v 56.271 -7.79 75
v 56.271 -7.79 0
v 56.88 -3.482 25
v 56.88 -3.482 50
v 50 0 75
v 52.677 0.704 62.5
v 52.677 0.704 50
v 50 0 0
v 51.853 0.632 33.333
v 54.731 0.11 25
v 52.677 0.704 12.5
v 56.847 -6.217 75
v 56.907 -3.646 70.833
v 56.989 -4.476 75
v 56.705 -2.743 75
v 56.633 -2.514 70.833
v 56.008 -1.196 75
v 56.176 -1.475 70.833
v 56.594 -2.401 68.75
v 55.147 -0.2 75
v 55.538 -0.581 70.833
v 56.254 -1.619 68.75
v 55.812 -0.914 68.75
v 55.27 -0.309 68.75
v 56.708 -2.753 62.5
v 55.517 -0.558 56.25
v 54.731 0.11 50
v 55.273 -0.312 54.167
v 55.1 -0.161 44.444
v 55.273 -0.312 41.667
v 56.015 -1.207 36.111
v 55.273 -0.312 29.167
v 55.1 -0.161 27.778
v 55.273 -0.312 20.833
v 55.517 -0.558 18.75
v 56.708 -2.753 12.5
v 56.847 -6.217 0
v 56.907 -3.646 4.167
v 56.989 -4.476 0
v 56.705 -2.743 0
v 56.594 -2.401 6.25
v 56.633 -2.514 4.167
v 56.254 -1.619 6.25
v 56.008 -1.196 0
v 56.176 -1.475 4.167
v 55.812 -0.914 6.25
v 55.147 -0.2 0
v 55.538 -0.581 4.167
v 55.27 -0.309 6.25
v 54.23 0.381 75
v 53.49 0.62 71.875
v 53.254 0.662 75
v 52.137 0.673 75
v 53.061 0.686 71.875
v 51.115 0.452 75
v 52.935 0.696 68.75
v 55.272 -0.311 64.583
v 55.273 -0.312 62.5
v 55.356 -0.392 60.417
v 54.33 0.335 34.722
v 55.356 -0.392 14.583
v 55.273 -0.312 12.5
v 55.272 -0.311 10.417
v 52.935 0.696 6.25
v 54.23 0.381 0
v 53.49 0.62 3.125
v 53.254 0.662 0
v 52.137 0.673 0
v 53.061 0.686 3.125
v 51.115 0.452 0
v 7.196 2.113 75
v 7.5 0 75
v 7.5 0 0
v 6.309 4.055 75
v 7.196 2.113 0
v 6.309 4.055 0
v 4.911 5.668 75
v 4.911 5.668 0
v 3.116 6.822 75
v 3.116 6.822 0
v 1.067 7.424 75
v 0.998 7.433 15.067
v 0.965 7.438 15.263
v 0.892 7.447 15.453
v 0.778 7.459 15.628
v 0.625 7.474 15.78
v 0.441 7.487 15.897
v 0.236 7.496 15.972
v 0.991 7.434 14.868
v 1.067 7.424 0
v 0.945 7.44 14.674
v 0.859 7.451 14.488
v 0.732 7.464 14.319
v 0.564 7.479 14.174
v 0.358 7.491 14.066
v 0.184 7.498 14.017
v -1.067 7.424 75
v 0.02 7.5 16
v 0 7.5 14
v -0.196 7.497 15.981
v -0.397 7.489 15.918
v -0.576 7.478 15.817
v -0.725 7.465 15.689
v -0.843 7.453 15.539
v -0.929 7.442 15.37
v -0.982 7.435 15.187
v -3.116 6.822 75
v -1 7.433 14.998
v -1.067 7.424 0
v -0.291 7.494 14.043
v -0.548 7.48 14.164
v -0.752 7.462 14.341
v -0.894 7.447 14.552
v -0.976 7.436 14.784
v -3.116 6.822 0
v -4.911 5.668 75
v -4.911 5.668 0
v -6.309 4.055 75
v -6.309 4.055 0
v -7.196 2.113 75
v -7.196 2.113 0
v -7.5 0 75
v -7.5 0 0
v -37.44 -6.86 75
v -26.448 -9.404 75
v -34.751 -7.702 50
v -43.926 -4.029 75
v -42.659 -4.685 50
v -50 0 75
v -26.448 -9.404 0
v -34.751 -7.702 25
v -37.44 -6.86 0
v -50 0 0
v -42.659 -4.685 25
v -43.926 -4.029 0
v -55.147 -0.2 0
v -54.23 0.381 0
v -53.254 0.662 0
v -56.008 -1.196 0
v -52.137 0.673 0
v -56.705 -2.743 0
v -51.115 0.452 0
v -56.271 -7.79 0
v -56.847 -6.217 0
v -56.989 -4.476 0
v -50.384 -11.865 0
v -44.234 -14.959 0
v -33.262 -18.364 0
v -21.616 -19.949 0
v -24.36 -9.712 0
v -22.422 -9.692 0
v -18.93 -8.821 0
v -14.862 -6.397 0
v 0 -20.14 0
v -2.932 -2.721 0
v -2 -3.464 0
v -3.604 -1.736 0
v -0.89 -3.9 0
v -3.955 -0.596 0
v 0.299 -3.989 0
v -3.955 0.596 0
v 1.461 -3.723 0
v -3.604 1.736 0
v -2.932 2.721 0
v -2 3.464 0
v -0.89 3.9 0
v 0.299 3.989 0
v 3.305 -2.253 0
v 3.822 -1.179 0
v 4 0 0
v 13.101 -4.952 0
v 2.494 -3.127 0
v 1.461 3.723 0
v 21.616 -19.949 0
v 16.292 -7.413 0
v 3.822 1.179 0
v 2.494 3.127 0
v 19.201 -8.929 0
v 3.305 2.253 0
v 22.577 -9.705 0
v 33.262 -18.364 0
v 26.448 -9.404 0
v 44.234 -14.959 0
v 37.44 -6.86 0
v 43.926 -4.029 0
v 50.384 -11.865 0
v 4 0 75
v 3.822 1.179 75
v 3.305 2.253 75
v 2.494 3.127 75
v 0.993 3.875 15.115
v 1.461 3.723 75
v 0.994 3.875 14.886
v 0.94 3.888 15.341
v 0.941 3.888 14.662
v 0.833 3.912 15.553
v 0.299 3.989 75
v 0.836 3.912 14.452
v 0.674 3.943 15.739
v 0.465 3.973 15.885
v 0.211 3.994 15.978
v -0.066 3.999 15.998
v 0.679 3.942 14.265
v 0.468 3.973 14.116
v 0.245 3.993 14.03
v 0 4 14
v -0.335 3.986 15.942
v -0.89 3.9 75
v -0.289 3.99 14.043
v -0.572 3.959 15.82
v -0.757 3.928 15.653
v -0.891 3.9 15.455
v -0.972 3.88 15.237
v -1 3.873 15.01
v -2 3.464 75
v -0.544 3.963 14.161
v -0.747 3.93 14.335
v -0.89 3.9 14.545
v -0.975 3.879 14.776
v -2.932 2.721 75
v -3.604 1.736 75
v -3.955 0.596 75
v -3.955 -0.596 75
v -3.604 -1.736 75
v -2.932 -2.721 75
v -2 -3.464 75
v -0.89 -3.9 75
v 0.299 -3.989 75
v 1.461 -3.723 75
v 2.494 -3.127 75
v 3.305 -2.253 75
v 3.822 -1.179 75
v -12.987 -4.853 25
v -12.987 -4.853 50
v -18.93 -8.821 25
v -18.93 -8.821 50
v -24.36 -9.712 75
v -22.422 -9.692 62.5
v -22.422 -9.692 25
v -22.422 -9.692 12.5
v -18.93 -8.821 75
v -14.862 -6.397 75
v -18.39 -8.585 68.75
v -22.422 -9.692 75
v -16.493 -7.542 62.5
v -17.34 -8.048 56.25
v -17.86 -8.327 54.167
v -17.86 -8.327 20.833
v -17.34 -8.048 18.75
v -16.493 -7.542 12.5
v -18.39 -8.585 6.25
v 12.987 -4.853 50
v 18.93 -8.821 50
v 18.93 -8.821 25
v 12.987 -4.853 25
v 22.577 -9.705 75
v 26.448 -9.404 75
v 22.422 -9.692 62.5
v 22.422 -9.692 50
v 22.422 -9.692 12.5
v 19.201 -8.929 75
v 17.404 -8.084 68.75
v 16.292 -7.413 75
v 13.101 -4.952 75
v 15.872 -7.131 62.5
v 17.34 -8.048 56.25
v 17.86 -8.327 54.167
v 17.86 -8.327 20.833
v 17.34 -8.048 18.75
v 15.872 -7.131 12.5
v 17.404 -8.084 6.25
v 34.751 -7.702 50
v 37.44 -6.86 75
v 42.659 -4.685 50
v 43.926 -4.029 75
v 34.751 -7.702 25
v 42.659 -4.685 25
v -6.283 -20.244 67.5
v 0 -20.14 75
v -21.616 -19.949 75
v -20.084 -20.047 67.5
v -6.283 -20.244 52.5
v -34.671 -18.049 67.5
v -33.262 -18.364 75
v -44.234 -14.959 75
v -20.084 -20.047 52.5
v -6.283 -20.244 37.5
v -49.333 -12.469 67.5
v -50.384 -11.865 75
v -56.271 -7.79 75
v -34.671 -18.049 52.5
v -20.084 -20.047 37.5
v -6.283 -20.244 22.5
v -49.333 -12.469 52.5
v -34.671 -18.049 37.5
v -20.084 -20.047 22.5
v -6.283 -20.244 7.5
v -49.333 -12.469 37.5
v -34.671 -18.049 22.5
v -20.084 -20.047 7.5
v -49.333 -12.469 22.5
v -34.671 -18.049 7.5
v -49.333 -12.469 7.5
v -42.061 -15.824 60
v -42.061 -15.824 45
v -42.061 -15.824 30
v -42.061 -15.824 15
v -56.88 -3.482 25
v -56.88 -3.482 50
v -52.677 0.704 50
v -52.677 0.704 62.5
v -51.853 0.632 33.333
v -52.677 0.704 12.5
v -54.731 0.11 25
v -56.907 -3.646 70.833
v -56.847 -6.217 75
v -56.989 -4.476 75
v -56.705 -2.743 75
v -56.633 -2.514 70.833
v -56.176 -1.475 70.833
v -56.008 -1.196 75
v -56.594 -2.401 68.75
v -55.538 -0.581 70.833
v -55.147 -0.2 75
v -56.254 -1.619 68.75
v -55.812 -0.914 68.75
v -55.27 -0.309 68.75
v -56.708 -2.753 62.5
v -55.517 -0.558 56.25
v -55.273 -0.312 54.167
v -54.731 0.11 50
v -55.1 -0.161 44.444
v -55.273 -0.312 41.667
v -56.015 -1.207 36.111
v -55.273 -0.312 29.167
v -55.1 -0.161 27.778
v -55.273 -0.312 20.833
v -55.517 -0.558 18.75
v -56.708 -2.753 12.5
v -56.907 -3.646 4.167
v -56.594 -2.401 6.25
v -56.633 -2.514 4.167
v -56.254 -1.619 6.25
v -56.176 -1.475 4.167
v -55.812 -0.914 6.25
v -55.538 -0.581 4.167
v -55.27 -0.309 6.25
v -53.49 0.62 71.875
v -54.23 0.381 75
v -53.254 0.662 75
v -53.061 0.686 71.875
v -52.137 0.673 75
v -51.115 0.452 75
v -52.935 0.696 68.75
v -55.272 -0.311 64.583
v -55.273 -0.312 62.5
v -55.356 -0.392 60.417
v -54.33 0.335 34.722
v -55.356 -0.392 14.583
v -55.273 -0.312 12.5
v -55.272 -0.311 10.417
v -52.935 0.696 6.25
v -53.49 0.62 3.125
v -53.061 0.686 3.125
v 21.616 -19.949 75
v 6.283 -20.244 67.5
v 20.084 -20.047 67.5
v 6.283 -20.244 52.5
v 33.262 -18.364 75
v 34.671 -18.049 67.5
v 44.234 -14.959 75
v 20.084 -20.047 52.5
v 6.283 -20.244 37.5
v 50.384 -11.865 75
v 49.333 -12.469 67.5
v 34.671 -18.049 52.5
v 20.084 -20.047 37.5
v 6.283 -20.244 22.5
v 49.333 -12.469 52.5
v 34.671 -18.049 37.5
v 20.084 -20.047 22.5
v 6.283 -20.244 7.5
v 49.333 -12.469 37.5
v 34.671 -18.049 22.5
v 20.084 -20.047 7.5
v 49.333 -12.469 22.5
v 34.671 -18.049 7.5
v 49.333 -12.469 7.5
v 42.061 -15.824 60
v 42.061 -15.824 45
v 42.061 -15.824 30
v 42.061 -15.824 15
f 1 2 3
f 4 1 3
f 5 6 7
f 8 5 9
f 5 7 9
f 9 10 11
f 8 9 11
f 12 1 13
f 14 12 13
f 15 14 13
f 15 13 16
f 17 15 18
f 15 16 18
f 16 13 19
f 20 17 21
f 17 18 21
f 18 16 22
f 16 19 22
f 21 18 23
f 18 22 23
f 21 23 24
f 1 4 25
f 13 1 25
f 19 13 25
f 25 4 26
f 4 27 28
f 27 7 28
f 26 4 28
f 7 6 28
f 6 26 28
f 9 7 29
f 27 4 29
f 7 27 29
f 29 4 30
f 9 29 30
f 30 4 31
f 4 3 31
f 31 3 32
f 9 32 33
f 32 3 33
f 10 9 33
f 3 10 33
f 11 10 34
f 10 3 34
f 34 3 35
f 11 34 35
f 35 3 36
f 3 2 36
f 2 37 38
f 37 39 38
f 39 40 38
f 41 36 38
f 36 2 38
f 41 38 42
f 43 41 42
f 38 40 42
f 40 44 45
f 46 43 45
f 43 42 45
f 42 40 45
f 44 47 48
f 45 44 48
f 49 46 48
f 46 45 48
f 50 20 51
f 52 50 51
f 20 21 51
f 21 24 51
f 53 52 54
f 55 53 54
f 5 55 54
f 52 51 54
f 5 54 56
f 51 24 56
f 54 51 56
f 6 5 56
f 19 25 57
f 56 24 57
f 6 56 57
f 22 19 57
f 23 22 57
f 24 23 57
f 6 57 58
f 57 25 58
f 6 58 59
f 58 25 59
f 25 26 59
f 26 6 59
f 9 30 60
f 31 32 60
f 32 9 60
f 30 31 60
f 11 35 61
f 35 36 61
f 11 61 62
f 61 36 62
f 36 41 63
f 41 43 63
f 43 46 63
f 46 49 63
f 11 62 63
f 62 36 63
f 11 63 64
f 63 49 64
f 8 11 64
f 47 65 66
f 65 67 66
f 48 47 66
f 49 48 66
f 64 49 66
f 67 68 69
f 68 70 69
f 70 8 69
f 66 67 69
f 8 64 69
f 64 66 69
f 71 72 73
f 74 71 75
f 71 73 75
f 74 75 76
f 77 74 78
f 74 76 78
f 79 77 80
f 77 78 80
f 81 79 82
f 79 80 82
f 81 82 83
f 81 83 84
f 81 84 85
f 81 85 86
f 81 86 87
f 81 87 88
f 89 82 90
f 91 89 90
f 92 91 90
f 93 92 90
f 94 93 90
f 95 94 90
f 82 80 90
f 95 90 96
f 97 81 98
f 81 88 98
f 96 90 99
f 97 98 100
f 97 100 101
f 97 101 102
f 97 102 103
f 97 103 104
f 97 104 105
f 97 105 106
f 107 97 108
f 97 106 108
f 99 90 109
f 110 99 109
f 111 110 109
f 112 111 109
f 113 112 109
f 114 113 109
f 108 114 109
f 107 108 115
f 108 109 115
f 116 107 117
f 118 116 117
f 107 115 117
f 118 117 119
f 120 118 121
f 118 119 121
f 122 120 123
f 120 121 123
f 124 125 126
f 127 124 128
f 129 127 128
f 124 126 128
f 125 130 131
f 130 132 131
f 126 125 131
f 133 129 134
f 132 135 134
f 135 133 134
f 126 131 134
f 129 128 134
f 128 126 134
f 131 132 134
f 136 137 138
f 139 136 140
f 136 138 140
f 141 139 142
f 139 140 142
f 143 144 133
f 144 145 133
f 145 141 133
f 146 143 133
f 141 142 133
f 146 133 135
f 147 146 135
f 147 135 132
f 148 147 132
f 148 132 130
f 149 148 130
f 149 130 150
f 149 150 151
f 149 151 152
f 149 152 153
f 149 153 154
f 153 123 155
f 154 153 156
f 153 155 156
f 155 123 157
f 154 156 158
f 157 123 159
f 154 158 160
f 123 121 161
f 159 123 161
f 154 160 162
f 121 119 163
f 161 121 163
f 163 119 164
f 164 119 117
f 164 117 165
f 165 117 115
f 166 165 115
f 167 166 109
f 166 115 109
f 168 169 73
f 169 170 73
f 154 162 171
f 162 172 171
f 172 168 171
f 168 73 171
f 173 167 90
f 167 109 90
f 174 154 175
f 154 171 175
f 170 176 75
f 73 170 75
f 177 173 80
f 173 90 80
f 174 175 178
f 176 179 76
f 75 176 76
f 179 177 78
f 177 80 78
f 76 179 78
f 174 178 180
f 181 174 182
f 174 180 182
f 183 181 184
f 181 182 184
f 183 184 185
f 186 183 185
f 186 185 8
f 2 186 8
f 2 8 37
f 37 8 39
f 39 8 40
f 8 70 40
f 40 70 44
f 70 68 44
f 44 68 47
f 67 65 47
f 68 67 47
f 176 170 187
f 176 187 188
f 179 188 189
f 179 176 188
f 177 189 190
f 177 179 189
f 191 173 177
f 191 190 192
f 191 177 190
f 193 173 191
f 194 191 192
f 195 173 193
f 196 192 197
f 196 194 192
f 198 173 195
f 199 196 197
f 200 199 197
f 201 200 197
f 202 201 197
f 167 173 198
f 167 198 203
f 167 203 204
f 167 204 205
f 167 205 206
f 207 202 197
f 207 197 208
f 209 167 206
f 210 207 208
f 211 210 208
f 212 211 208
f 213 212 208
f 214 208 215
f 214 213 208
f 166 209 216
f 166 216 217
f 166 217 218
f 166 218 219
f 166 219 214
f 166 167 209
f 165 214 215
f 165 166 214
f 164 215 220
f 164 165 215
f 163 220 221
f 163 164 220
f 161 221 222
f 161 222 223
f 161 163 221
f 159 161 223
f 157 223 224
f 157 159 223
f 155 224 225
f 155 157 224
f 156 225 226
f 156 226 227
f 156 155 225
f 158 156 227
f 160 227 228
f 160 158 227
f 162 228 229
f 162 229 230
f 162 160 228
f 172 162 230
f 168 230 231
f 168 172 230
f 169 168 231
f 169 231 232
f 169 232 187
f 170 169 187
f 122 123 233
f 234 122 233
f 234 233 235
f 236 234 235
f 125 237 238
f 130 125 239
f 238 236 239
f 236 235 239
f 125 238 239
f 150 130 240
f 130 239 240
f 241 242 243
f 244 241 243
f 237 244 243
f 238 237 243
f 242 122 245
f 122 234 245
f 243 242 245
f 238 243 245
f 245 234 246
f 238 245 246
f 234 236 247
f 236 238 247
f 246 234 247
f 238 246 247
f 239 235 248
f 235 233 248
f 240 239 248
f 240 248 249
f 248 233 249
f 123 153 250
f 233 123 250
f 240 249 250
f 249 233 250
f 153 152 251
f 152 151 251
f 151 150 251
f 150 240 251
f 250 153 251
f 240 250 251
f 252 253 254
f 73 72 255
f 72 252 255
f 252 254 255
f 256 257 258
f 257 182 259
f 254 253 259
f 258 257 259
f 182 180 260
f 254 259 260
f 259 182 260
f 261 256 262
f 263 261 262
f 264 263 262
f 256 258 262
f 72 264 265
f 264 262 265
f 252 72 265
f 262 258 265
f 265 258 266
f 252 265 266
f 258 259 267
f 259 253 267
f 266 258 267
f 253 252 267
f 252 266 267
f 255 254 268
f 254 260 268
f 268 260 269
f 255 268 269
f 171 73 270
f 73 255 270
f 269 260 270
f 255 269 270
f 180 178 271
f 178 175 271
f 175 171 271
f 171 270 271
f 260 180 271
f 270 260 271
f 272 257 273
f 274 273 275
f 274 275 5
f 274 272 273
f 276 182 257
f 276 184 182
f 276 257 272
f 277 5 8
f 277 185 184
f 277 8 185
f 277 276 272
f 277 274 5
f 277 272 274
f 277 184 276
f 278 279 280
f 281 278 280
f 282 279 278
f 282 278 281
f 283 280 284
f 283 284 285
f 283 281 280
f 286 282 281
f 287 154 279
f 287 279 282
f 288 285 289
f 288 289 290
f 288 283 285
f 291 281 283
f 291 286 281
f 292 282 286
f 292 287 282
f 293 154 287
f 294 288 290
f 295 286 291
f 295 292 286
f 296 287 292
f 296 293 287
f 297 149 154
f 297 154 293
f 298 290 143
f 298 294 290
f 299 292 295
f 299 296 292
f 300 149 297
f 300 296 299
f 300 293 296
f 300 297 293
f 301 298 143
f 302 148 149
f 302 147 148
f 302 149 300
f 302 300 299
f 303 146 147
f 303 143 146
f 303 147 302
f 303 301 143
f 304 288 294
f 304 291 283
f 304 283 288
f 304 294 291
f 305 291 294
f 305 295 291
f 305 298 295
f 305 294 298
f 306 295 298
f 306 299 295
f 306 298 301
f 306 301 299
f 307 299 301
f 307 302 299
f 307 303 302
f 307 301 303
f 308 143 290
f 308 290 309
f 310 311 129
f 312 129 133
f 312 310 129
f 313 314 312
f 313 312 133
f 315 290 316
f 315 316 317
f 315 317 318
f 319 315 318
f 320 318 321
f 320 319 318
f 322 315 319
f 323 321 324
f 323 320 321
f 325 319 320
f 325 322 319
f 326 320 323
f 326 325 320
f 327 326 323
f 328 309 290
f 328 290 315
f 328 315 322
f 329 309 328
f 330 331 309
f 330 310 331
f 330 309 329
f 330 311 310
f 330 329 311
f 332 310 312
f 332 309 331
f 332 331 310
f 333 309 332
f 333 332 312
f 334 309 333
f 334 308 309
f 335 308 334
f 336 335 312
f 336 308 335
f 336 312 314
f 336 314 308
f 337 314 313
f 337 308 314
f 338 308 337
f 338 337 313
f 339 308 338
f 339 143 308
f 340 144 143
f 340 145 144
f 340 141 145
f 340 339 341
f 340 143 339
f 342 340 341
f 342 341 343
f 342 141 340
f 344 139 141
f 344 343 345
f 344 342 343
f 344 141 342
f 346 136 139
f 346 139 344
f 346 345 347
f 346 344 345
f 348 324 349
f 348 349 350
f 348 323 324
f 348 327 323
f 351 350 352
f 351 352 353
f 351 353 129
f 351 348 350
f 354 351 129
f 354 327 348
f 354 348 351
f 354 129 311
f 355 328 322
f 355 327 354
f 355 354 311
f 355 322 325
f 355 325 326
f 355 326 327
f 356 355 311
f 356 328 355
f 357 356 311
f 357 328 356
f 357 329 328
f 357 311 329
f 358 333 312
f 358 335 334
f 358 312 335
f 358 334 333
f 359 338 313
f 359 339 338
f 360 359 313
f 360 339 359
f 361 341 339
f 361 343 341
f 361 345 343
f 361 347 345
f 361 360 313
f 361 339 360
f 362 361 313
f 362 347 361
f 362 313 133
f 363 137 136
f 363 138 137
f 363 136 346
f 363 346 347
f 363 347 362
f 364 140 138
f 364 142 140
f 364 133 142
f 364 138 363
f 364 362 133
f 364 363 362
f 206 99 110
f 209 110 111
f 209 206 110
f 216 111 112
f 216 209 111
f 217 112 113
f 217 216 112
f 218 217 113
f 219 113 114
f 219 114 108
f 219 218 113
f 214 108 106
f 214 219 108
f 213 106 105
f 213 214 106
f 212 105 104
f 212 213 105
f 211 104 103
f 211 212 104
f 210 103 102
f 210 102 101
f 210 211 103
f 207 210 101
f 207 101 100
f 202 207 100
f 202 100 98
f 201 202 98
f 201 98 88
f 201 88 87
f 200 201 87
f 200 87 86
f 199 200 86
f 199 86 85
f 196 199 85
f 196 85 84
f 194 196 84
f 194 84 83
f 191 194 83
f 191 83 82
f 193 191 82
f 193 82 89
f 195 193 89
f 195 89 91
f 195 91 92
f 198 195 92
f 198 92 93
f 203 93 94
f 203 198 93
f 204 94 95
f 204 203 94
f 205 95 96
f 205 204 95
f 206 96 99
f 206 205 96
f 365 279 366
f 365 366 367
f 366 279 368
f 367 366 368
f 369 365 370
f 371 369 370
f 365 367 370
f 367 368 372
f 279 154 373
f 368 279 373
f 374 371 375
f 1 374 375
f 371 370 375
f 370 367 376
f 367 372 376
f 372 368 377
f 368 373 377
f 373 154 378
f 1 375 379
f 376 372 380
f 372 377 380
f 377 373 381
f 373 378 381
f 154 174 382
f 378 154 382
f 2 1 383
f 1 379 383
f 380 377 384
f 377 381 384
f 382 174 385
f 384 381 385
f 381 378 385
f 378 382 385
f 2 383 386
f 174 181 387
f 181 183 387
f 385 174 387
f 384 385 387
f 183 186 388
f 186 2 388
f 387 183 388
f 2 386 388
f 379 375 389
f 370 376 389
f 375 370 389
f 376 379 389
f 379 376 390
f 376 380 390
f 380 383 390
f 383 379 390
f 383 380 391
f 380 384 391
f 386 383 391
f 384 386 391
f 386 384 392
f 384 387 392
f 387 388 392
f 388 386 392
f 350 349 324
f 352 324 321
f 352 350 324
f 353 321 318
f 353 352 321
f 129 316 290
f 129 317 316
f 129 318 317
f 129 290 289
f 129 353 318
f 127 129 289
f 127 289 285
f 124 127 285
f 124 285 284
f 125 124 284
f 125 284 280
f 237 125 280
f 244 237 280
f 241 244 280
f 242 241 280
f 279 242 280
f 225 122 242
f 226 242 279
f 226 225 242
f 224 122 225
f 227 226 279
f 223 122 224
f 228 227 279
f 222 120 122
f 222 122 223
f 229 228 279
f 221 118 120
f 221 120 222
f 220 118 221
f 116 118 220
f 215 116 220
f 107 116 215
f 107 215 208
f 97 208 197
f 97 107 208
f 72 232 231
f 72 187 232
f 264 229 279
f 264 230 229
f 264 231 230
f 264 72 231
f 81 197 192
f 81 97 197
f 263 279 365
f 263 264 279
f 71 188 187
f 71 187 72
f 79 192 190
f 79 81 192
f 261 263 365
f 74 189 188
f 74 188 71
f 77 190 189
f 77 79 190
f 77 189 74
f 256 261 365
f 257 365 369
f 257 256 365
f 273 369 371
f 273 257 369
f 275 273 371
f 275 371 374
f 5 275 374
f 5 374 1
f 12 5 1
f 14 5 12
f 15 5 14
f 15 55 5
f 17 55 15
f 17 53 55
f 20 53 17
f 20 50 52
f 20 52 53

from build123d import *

# Parameters (mm, degrees)
SKETCH1_R           = 4
BOSS_EXTRUDE1_DEPTH = 75
SKETCH2_R           = 1
CUT_EXTRUDE1_DEPTH  = 75


with BuildPart() as part:
    # Sketch1 → Boss-Extrude1 (new body)
    with BuildSketch(Plane.XY):
        with BuildLine():
            ThreePointArc((7.5, 0), (0, 7.5), (-7.5, 0))
            add(Edge.make_bspline(
                [(-7.5, 0), (-13.133413819, -4.461912435), (-17.767441975, -11.345900192), (-26.448408985, -9.404150694)],
                knots=[0, 0, 0, 0, 1, 1, 1, 1], degree=3))
            add(Edge.make_bspline(
                [(-26.448408985, -9.404150694), (-34.892519394, -8.241593996), (-42.998591866, -5.63640498), (-50, 0)],
                knots=[0.508532521, 0.508532521, 0.508532521, 0.508532521, 1, 1, 1, 1], degree=3))
            add(Edge.make_bspline(
                [(-56.270853764, -7.789505316), (-58.317034017, -4.120672935), (-55.963516082, 2.956586768), (-50, 0)],
                knots=[0, 0, 0, 0, 1, 1, 1, 1], degree=3))
            add(Edge.make_bspline(
                [(0, -20.140225697), (-1.00593636, -20.15524797), (-3.047640759, -20.191257315), (-7.361898098, -20.266311816), (-13.006626751, -20.313476944), (-20.051108834, -20.120955208), (-27.291030951, -19.487291375), (-34.664372738, -18.197237521), (-42.077214845, -16.015044344), (-48.172992704, -13.24242478), (-52.871586187, -10.367033149), (-55.170435724, -8.6753845), (-56.270853764, -7.789505316)],
                knots=[0.002895243, 0.002895243, 0.002895243, 0.002895243, 0.0625, 0.125, 0.25, 0.375, 0.5, 0.625, 0.75, 0.875, 0.9375, 1, 1, 1, 1], degree=3))
            add(Edge.make_bspline(
                [(0, -20.140225697), (1.00593636, -20.15524797), (3.047640759, -20.191257315), (7.361898098, -20.266311816), (13.006626751, -20.313476944), (20.051108834, -20.120955208), (27.291030951, -19.487291375), (34.664372738, -18.197237521), (42.077214845, -16.015044344), (48.172992704, -13.24242478), (52.871586187, -10.367033149), (55.170435724, -8.6753845), (56.270853764, -7.789505316)],
                knots=[0.002895243, 0.002895243, 0.002895243, 0.002895243, 0.0625, 0.125, 0.25, 0.375, 0.5, 0.625, 0.75, 0.875, 0.9375, 1, 1, 1, 1], degree=3))
            add(Edge.make_bspline(
                [(56.270853764, -7.789505316), (58.317034017, -4.120672935), (55.963516082, 2.956586768), (50, 0)],
                knots=[0, 0, 0, 0, 1, 1, 1, 1], degree=3))
            add(Edge.make_bspline(
                [(26.448408985, -9.404150694), (34.892519394, -8.241593996), (42.998591866, -5.63640498), (50, 0)],
                knots=[0.508532521, 0.508532521, 0.508532521, 0.508532521, 1, 1, 1, 1], degree=3))
            add(Edge.make_bspline(
                [(26.448408985, -9.404150694), (17.767441975, -11.345900192), (13.133413819, -4.461912435), (7.5, 0)],
                knots=[0.885469804, 0.885469804, 0.885469804, 0.885469804, 1.885469804, 1.885469804, 1.885469804, 1.885469804], degree=3))
        make_face()
        Circle(SKETCH1_R, mode=Mode.SUBTRACT)
    extrude(amount=BOSS_EXTRUDE1_DEPTH)

    # Sketch2 → Cut-Extrude1 (cut)
    with BuildSketch(Plane(origin=(0, 0, 0), x_dir=(1, 0, 0), z_dir=(0, 1, 0))):
        with Locations(Location((0, -15, 0), (0, 0, 90))):
            Circle(SKETCH2_R)
    extrude(amount=CUT_EXTRUDE1_DEPTH, mode=Mode.SUBTRACT)


solid = part.part
